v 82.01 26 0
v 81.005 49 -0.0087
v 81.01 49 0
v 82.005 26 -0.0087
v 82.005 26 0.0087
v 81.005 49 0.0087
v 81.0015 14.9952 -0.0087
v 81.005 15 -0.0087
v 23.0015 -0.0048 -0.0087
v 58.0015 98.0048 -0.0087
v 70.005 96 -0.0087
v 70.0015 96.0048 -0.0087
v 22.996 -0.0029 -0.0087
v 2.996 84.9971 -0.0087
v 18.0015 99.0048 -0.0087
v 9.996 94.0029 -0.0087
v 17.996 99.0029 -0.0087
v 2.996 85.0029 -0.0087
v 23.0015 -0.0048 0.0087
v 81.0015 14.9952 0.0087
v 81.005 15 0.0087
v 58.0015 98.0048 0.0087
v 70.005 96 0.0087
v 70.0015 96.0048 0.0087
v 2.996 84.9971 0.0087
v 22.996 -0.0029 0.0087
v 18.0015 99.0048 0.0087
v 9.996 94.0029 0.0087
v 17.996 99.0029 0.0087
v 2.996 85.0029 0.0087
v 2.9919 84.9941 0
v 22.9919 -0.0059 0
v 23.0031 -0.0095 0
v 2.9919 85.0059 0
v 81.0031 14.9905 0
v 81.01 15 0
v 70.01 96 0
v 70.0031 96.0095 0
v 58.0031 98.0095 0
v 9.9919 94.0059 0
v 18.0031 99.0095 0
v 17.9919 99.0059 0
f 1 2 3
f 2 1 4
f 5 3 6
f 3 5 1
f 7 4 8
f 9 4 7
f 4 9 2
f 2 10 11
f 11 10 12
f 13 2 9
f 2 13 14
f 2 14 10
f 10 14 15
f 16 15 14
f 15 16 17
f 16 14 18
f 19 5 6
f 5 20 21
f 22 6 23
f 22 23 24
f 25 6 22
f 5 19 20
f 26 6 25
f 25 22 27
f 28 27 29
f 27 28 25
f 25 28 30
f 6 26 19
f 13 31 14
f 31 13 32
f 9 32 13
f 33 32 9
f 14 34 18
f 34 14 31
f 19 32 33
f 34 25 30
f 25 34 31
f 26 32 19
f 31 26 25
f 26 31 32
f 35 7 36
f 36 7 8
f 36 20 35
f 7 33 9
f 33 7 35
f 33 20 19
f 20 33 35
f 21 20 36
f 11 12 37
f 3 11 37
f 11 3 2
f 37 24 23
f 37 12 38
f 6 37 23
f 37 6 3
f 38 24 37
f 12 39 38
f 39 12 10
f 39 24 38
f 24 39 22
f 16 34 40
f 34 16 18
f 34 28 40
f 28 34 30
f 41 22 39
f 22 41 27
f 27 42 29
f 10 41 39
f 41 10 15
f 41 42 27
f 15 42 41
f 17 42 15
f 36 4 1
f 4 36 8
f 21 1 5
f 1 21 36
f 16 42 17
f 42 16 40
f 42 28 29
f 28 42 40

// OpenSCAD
color([0.5839405385485582,0.4048698908705002,0.6877557316706271]) hull(){
    translate([81,49]) sphere(0.01);
    translate([77,50]) sphere(0.01);
    translate([82,26]) sphere(0.01);
}
color([0.29310936231965135,0.08456113000314536,0.6409271470126323]) hull(){
    translate([23,0]) sphere(0.01);
    translate([18,24]) sphere(0.01);
    translate([3,85]) sphere(0.01);
}
color([0.38512246522478266,0.6162859510128613,0.407224705538046]) hull(){
    translate([81,15]) sphere(0.01);
    translate([64,14]) sphere(0.01);
    translate([23,0]) sphere(0.01);
}
color([0.6107800780239486,0.9541913078580654,0.09369719926319908]) hull(){
    translate([64,14]) sphere(0.01);
    translate([42,29]) sphere(0.01);
    translate([23,0]) sphere(0.01);
}
color([0.4396226851829427,0.9817497074141792,0.30111933510979894]) hull(){
    translate([42,29]) sphere(0.01);
    translate([44,47]) sphere(0.01);
    translate([35,48]) sphere(0.01);
}
color([0.08571041628526821,0.691130580335744,0.16573157374072334]) hull(){
    translate([18,24]) sphere(0.01);
    translate([18,58]) sphere(0.01);
    translate([3,85]) sphere(0.01);
}
color([0.4668304924867862,0.30100213617539295,0.3511677492745029]) hull(){
    translate([80,52]) sphere(0.01);
    translate([81,49]) sphere(0.01);
    translate([70,96]) sphere(0.01);
}
color([0.05564944269037686,0.7696481469448815,0.686275624239137]) hull(){
    translate([81,49]) sphere(0.01);
    translate([80,52]) sphere(0.01);
    translate([77,50]) sphere(0.01);
}
color([0.15447252119296884,0.35335085758162643,0.18799175914388588]) hull(){
    translate([26,22]) sphere(0.01);
    translate([42,29]) sphere(0.01);
    translate([35,48]) sphere(0.01);
}
color([0.41322879780265653,0.82270842281296,0.9057146612667819]) hull(){
    translate([42,29]) sphere(0.01);
    translate([26,22]) sphere(0.01);
    translate([23,0]) sphere(0.01);
}
color([0.9688547633127277,0.5528378273263655,0.12760284187612392]) hull(){
    translate([68,15]) sphere(0.01);
    translate([64,14]) sphere(0.01);
    translate([81,15]) sphere(0.01);
}
color([0.1710979555253146,0.7131998843266452,0.6397779425125977]) hull(){
    translate([59,71]) sphere(0.01);
    translate([80,52]) sphere(0.01);
    translate([70,96]) sphere(0.01);
}
color([0.57496968906483,0.8489371230716904,0.07944838941339594]) hull(){
    translate([80,52]) sphere(0.01);
    translate([59,71]) sphere(0.01);
    translate([77,50]) sphere(0.01);
}
color([0.040333123224873146,0.9305910632054132,0.3080440975445232]) hull(){
    translate([58,98]) sphere(0.01);
    translate([59,71]) sphere(0.01);
    translate([70,96]) sphere(0.01);
}
color([0.6084655882345898,0.4923441190446234,0.7069385087242315]) hull(){
    translate([59,71]) sphere(0.01);
    translate([58,98]) sphere(0.01);
    translate([50,93]) sphere(0.01);
}
color([0.6803385961846494,0.18024793645131376,0.10787678186317007]) hull(){
    translate([6,84]) sphere(0.01);
    translate([10,94]) sphere(0.01);
    translate([3,85]) sphere(0.01);
}
color([0.1335624130282893,0.47731112778056706,0.8393950916733898]) hull(){
    translate([18,58]) sphere(0.01);
    translate([6,84]) sphere(0.01);
    translate([3,85]) sphere(0.01);
}
color([0.6780893207968227,0.08337096158279222,0.27725115680544954]) hull(){
    translate([20,83]) sphere(0.01);
    translate([59,71]) sphere(0.01);
    translate([50,93]) sphere(0.01);
}
color([0.9965791662073833,0.03375154870506614,0.10494976972159242]) hull(){
    translate([6,84]) sphere(0.01);
    translate([20,83]) sphere(0.01);
    translate([10,94]) sphere(0.01);
}
color([0.516844917539197,0.1360610465034362,0.543805910213663]) hull(){
    translate([24,21]) sphere(0.01);
    translate([18,24]) sphere(0.01);
    translate([23,0]) sphere(0.01);
}
color([0.04901628196141694,0.4867102513994055,0.8813892002857401]) hull(){
    translate([26,22]) sphere(0.01);
    translate([24,21]) sphere(0.01);
    translate([23,0]) sphere(0.01);
}
color([0.3053751014353143,0.40772022041766365,0.31297204198076634]) hull(){
    translate([24,21]) sphere(0.01);
    translate([26,22]) sphere(0.01);
    translate([18,24]) sphere(0.01);
}
color([0.49907796034366436,0.6160709555012981,0.9916538905911245]) hull(){
    translate([77,50]) sphere(0.01);
    translate([58,33]) sphere(0.01);
    translate([82,26]) sphere(0.01);
}
color([0.3123575451593331,0.46364206475662195,0.8862899719975306]) hull(){
    translate([44,47]) sphere(0.01);
    translate([58,33]) sphere(0.01);
    translate([77,50]) sphere(0.01);
}
color([0.5738800220993816,0.8494037217359881,0.24323676398212035]) hull(){
    translate([58,33]) sphere(0.01);
    translate([44,47]) sphere(0.01);
    translate([42,29]) sphere(0.01);
}
color([0.8402878098664139,0.9530478541805099,0.16594803365564914]) hull(){
    translate([64,14]) sphere(0.01);
    translate([58,33]) sphere(0.01);
    translate([42,29]) sphere(0.01);
}
color([0.0023370868964924796,0.7387895340607371,0.5374530602666081]) hull(){
    translate([44,55]) sphere(0.01);
    translate([44,47]) sphere(0.01);
    translate([77,50]) sphere(0.01);
}
color([0.25604025835089217,0.4320068924153808,0.5112453323210508]) hull(){
    translate([59,71]) sphere(0.01);
    translate([44,55]) sphere(0.01);
    translate([77,50]) sphere(0.01);
}
color([0.7462272619347637,0.5039790716190428,0.8850839351693509]) hull(){
    translate([44,47]) sphere(0.01);
    translate([44,55]) sphere(0.01);
    translate([35,48]) sphere(0.01);
}
color([0.6652757233710683,0.22263754843686523,0.08942086350367451]) hull(){
    translate([39,98]) sphere(0.01);
    translate([20,83]) sphere(0.01);
    translate([50,93]) sphere(0.01);
}
color([0.6195232841458308,0.9036720387350747,0.7222923954673625]) hull(){
    translate([39,98]) sphere(0.01);
    translate([58,98]) sphere(0.01);
    translate([18,99]) sphere(0.01);
}
color([0.6665075097113882,0.5421139713900744,0.6943978877819516]) hull(){
    translate([58,98]) sphere(0.01);
    translate([39,98]) sphere(0.01);
    translate([50,93]) sphere(0.01);
}
color([0.9269770591996176,0.12480324665016229,0.8422397758241813]) hull(){
    translate([16,79]) sphere(0.01);
    translate([6,84]) sphere(0.01);
    translate([18,58]) sphere(0.01);
}
color([0.028249143050612435,0.8554899328562455,0.6212809598996976]) hull(){
    translate([16,79]) sphere(0.01);
    translate([20,83]) sphere(0.01);
    translate([6,84]) sphere(0.01);
}
color([0.6435486749275994,0.4857227915978113,0.2898251547629681]) hull(){
    translate([68,15]) sphere(0.01);
    translate([72,20]) sphere(0.01);
    translate([64,14]) sphere(0.01);
}
color([0.21709076393122206,0.4979948584580751,0.6176241526046676]) hull(){
    translate([72,20]) sphere(0.01);
    translate([58,33]) sphere(0.01);
    translate([64,14]) sphere(0.01);
}
color([0.4722249532281336,0.7228331534363125,0.6109414561657331]) hull(){
    translate([58,33]) sphere(0.01);
    translate([72,20]) sphere(0.01);
    translate([82,26]) sphere(0.01);
}
color([0.5330085163671737,0.6769359871291822,0.5973748769978083]) hull(){
    translate([72,20]) sphere(0.01);
    translate([81,15]) sphere(0.01);
    translate([82,26]) sphere(0.01);
}
color([0.14460255854654236,0.21273280877313017,0.8417179364881341]) hull(){
    translate([72,20]) sphere(0.01);
    translate([68,15]) sphere(0.01);
    translate([81,15]) sphere(0.01);
}
color([0.6300391880279899,0.5103677782275869,0.4479627161837708]) hull(){
    translate([20,83]) sphere(0.01);
    translate([30,57]) sphere(0.01);
    translate([59,71]) sphere(0.01);
}
color([0.2903518628620462,0.1744676713524972,0.5457372127765215]) hull(){
    translate([30,57]) sphere(0.01);
    translate([44,55]) sphere(0.01);
    translate([59,71]) sphere(0.01);
}
color([0.6340658375422632,0.7004271366493812,0.690956934786038]) hull(){
    translate([30,57]) sphere(0.01);
    translate([16,79]) sphere(0.01);
    translate([18,58]) sphere(0.01);
}
color([0.013948469234104865,0.8018456354370093,0.2607079205191076]) hull(){
    translate([16,79]) sphere(0.01);
    translate([30,57]) sphere(0.01);
    translate([20,83]) sphere(0.01);
}
color([0.01899716010339858,0.7507132946374245,0.44168653561511173]) hull(){
    translate([44,55]) sphere(0.01);
    translate([30,57]) sphere(0.01);
    translate([35,48]) sphere(0.01);
}
color([0.1668653701245908,0.45955837321901094,0.7876756969907556]) hull(){
    translate([22,90]) sphere(0.01);
    translate([39,98]) sphere(0.01);
    translate([18,99]) sphere(0.01);
}
color([0.09564527702692727,0.06733136152719421,0.7816649665975636]) hull(){
    translate([39,98]) sphere(0.01);
    translate([22,90]) sphere(0.01);
    translate([20,83]) sphere(0.01);
}
color([0.030385075649315252,0.33346286891595733,0.08647112242809318]) hull(){
    translate([10,94]) sphere(0.01);
    translate([22,90]) sphere(0.01);
    translate([18,99]) sphere(0.01);
}
color([0.8161439782233904,0.05657658467482607,0.8243668117903717]) hull(){
    translate([20,83]) sphere(0.01);
    translate([22,90]) sphere(0.01);
    translate([10,94]) sphere(0.01);
}
color([0.05808931884644186,0.6181904095369413,0.1426995958976538]) hull(){
    translate([30,57]) sphere(0.01);
    translate([26,51]) sphere(0.01);
    translate([35,48]) sphere(0.01);
}
color([0.3846464495954227,0.3794414211645075,0.7643773332264734]) hull(){
    translate([26,51]) sphere(0.01);
    translate([30,57]) sphere(0.01);
    translate([18,58]) sphere(0.01);
}
color([0.3116889002403487,0.7690158776827113,0.7674729074453902]) hull(){
    translate([26,51]) sphere(0.01);
    translate([18,58]) sphere(0.01);
    translate([18,24]) sphere(0.01);
}
color([0.3394448706328078,0.45855440081433096,0.0007502935671159783]) hull(){
    translate([26,51]) sphere(0.01);
    translate([26,22]) sphere(0.01);
    translate([35,48]) sphere(0.01);
}
color([0.8084995756647368,0.0331322283588068,0.9954935019736515]) hull(){
    translate([26,22]) sphere(0.01);
    translate([26,51]) sphere(0.01);
    translate([18,24]) sphere(0.01);
}
